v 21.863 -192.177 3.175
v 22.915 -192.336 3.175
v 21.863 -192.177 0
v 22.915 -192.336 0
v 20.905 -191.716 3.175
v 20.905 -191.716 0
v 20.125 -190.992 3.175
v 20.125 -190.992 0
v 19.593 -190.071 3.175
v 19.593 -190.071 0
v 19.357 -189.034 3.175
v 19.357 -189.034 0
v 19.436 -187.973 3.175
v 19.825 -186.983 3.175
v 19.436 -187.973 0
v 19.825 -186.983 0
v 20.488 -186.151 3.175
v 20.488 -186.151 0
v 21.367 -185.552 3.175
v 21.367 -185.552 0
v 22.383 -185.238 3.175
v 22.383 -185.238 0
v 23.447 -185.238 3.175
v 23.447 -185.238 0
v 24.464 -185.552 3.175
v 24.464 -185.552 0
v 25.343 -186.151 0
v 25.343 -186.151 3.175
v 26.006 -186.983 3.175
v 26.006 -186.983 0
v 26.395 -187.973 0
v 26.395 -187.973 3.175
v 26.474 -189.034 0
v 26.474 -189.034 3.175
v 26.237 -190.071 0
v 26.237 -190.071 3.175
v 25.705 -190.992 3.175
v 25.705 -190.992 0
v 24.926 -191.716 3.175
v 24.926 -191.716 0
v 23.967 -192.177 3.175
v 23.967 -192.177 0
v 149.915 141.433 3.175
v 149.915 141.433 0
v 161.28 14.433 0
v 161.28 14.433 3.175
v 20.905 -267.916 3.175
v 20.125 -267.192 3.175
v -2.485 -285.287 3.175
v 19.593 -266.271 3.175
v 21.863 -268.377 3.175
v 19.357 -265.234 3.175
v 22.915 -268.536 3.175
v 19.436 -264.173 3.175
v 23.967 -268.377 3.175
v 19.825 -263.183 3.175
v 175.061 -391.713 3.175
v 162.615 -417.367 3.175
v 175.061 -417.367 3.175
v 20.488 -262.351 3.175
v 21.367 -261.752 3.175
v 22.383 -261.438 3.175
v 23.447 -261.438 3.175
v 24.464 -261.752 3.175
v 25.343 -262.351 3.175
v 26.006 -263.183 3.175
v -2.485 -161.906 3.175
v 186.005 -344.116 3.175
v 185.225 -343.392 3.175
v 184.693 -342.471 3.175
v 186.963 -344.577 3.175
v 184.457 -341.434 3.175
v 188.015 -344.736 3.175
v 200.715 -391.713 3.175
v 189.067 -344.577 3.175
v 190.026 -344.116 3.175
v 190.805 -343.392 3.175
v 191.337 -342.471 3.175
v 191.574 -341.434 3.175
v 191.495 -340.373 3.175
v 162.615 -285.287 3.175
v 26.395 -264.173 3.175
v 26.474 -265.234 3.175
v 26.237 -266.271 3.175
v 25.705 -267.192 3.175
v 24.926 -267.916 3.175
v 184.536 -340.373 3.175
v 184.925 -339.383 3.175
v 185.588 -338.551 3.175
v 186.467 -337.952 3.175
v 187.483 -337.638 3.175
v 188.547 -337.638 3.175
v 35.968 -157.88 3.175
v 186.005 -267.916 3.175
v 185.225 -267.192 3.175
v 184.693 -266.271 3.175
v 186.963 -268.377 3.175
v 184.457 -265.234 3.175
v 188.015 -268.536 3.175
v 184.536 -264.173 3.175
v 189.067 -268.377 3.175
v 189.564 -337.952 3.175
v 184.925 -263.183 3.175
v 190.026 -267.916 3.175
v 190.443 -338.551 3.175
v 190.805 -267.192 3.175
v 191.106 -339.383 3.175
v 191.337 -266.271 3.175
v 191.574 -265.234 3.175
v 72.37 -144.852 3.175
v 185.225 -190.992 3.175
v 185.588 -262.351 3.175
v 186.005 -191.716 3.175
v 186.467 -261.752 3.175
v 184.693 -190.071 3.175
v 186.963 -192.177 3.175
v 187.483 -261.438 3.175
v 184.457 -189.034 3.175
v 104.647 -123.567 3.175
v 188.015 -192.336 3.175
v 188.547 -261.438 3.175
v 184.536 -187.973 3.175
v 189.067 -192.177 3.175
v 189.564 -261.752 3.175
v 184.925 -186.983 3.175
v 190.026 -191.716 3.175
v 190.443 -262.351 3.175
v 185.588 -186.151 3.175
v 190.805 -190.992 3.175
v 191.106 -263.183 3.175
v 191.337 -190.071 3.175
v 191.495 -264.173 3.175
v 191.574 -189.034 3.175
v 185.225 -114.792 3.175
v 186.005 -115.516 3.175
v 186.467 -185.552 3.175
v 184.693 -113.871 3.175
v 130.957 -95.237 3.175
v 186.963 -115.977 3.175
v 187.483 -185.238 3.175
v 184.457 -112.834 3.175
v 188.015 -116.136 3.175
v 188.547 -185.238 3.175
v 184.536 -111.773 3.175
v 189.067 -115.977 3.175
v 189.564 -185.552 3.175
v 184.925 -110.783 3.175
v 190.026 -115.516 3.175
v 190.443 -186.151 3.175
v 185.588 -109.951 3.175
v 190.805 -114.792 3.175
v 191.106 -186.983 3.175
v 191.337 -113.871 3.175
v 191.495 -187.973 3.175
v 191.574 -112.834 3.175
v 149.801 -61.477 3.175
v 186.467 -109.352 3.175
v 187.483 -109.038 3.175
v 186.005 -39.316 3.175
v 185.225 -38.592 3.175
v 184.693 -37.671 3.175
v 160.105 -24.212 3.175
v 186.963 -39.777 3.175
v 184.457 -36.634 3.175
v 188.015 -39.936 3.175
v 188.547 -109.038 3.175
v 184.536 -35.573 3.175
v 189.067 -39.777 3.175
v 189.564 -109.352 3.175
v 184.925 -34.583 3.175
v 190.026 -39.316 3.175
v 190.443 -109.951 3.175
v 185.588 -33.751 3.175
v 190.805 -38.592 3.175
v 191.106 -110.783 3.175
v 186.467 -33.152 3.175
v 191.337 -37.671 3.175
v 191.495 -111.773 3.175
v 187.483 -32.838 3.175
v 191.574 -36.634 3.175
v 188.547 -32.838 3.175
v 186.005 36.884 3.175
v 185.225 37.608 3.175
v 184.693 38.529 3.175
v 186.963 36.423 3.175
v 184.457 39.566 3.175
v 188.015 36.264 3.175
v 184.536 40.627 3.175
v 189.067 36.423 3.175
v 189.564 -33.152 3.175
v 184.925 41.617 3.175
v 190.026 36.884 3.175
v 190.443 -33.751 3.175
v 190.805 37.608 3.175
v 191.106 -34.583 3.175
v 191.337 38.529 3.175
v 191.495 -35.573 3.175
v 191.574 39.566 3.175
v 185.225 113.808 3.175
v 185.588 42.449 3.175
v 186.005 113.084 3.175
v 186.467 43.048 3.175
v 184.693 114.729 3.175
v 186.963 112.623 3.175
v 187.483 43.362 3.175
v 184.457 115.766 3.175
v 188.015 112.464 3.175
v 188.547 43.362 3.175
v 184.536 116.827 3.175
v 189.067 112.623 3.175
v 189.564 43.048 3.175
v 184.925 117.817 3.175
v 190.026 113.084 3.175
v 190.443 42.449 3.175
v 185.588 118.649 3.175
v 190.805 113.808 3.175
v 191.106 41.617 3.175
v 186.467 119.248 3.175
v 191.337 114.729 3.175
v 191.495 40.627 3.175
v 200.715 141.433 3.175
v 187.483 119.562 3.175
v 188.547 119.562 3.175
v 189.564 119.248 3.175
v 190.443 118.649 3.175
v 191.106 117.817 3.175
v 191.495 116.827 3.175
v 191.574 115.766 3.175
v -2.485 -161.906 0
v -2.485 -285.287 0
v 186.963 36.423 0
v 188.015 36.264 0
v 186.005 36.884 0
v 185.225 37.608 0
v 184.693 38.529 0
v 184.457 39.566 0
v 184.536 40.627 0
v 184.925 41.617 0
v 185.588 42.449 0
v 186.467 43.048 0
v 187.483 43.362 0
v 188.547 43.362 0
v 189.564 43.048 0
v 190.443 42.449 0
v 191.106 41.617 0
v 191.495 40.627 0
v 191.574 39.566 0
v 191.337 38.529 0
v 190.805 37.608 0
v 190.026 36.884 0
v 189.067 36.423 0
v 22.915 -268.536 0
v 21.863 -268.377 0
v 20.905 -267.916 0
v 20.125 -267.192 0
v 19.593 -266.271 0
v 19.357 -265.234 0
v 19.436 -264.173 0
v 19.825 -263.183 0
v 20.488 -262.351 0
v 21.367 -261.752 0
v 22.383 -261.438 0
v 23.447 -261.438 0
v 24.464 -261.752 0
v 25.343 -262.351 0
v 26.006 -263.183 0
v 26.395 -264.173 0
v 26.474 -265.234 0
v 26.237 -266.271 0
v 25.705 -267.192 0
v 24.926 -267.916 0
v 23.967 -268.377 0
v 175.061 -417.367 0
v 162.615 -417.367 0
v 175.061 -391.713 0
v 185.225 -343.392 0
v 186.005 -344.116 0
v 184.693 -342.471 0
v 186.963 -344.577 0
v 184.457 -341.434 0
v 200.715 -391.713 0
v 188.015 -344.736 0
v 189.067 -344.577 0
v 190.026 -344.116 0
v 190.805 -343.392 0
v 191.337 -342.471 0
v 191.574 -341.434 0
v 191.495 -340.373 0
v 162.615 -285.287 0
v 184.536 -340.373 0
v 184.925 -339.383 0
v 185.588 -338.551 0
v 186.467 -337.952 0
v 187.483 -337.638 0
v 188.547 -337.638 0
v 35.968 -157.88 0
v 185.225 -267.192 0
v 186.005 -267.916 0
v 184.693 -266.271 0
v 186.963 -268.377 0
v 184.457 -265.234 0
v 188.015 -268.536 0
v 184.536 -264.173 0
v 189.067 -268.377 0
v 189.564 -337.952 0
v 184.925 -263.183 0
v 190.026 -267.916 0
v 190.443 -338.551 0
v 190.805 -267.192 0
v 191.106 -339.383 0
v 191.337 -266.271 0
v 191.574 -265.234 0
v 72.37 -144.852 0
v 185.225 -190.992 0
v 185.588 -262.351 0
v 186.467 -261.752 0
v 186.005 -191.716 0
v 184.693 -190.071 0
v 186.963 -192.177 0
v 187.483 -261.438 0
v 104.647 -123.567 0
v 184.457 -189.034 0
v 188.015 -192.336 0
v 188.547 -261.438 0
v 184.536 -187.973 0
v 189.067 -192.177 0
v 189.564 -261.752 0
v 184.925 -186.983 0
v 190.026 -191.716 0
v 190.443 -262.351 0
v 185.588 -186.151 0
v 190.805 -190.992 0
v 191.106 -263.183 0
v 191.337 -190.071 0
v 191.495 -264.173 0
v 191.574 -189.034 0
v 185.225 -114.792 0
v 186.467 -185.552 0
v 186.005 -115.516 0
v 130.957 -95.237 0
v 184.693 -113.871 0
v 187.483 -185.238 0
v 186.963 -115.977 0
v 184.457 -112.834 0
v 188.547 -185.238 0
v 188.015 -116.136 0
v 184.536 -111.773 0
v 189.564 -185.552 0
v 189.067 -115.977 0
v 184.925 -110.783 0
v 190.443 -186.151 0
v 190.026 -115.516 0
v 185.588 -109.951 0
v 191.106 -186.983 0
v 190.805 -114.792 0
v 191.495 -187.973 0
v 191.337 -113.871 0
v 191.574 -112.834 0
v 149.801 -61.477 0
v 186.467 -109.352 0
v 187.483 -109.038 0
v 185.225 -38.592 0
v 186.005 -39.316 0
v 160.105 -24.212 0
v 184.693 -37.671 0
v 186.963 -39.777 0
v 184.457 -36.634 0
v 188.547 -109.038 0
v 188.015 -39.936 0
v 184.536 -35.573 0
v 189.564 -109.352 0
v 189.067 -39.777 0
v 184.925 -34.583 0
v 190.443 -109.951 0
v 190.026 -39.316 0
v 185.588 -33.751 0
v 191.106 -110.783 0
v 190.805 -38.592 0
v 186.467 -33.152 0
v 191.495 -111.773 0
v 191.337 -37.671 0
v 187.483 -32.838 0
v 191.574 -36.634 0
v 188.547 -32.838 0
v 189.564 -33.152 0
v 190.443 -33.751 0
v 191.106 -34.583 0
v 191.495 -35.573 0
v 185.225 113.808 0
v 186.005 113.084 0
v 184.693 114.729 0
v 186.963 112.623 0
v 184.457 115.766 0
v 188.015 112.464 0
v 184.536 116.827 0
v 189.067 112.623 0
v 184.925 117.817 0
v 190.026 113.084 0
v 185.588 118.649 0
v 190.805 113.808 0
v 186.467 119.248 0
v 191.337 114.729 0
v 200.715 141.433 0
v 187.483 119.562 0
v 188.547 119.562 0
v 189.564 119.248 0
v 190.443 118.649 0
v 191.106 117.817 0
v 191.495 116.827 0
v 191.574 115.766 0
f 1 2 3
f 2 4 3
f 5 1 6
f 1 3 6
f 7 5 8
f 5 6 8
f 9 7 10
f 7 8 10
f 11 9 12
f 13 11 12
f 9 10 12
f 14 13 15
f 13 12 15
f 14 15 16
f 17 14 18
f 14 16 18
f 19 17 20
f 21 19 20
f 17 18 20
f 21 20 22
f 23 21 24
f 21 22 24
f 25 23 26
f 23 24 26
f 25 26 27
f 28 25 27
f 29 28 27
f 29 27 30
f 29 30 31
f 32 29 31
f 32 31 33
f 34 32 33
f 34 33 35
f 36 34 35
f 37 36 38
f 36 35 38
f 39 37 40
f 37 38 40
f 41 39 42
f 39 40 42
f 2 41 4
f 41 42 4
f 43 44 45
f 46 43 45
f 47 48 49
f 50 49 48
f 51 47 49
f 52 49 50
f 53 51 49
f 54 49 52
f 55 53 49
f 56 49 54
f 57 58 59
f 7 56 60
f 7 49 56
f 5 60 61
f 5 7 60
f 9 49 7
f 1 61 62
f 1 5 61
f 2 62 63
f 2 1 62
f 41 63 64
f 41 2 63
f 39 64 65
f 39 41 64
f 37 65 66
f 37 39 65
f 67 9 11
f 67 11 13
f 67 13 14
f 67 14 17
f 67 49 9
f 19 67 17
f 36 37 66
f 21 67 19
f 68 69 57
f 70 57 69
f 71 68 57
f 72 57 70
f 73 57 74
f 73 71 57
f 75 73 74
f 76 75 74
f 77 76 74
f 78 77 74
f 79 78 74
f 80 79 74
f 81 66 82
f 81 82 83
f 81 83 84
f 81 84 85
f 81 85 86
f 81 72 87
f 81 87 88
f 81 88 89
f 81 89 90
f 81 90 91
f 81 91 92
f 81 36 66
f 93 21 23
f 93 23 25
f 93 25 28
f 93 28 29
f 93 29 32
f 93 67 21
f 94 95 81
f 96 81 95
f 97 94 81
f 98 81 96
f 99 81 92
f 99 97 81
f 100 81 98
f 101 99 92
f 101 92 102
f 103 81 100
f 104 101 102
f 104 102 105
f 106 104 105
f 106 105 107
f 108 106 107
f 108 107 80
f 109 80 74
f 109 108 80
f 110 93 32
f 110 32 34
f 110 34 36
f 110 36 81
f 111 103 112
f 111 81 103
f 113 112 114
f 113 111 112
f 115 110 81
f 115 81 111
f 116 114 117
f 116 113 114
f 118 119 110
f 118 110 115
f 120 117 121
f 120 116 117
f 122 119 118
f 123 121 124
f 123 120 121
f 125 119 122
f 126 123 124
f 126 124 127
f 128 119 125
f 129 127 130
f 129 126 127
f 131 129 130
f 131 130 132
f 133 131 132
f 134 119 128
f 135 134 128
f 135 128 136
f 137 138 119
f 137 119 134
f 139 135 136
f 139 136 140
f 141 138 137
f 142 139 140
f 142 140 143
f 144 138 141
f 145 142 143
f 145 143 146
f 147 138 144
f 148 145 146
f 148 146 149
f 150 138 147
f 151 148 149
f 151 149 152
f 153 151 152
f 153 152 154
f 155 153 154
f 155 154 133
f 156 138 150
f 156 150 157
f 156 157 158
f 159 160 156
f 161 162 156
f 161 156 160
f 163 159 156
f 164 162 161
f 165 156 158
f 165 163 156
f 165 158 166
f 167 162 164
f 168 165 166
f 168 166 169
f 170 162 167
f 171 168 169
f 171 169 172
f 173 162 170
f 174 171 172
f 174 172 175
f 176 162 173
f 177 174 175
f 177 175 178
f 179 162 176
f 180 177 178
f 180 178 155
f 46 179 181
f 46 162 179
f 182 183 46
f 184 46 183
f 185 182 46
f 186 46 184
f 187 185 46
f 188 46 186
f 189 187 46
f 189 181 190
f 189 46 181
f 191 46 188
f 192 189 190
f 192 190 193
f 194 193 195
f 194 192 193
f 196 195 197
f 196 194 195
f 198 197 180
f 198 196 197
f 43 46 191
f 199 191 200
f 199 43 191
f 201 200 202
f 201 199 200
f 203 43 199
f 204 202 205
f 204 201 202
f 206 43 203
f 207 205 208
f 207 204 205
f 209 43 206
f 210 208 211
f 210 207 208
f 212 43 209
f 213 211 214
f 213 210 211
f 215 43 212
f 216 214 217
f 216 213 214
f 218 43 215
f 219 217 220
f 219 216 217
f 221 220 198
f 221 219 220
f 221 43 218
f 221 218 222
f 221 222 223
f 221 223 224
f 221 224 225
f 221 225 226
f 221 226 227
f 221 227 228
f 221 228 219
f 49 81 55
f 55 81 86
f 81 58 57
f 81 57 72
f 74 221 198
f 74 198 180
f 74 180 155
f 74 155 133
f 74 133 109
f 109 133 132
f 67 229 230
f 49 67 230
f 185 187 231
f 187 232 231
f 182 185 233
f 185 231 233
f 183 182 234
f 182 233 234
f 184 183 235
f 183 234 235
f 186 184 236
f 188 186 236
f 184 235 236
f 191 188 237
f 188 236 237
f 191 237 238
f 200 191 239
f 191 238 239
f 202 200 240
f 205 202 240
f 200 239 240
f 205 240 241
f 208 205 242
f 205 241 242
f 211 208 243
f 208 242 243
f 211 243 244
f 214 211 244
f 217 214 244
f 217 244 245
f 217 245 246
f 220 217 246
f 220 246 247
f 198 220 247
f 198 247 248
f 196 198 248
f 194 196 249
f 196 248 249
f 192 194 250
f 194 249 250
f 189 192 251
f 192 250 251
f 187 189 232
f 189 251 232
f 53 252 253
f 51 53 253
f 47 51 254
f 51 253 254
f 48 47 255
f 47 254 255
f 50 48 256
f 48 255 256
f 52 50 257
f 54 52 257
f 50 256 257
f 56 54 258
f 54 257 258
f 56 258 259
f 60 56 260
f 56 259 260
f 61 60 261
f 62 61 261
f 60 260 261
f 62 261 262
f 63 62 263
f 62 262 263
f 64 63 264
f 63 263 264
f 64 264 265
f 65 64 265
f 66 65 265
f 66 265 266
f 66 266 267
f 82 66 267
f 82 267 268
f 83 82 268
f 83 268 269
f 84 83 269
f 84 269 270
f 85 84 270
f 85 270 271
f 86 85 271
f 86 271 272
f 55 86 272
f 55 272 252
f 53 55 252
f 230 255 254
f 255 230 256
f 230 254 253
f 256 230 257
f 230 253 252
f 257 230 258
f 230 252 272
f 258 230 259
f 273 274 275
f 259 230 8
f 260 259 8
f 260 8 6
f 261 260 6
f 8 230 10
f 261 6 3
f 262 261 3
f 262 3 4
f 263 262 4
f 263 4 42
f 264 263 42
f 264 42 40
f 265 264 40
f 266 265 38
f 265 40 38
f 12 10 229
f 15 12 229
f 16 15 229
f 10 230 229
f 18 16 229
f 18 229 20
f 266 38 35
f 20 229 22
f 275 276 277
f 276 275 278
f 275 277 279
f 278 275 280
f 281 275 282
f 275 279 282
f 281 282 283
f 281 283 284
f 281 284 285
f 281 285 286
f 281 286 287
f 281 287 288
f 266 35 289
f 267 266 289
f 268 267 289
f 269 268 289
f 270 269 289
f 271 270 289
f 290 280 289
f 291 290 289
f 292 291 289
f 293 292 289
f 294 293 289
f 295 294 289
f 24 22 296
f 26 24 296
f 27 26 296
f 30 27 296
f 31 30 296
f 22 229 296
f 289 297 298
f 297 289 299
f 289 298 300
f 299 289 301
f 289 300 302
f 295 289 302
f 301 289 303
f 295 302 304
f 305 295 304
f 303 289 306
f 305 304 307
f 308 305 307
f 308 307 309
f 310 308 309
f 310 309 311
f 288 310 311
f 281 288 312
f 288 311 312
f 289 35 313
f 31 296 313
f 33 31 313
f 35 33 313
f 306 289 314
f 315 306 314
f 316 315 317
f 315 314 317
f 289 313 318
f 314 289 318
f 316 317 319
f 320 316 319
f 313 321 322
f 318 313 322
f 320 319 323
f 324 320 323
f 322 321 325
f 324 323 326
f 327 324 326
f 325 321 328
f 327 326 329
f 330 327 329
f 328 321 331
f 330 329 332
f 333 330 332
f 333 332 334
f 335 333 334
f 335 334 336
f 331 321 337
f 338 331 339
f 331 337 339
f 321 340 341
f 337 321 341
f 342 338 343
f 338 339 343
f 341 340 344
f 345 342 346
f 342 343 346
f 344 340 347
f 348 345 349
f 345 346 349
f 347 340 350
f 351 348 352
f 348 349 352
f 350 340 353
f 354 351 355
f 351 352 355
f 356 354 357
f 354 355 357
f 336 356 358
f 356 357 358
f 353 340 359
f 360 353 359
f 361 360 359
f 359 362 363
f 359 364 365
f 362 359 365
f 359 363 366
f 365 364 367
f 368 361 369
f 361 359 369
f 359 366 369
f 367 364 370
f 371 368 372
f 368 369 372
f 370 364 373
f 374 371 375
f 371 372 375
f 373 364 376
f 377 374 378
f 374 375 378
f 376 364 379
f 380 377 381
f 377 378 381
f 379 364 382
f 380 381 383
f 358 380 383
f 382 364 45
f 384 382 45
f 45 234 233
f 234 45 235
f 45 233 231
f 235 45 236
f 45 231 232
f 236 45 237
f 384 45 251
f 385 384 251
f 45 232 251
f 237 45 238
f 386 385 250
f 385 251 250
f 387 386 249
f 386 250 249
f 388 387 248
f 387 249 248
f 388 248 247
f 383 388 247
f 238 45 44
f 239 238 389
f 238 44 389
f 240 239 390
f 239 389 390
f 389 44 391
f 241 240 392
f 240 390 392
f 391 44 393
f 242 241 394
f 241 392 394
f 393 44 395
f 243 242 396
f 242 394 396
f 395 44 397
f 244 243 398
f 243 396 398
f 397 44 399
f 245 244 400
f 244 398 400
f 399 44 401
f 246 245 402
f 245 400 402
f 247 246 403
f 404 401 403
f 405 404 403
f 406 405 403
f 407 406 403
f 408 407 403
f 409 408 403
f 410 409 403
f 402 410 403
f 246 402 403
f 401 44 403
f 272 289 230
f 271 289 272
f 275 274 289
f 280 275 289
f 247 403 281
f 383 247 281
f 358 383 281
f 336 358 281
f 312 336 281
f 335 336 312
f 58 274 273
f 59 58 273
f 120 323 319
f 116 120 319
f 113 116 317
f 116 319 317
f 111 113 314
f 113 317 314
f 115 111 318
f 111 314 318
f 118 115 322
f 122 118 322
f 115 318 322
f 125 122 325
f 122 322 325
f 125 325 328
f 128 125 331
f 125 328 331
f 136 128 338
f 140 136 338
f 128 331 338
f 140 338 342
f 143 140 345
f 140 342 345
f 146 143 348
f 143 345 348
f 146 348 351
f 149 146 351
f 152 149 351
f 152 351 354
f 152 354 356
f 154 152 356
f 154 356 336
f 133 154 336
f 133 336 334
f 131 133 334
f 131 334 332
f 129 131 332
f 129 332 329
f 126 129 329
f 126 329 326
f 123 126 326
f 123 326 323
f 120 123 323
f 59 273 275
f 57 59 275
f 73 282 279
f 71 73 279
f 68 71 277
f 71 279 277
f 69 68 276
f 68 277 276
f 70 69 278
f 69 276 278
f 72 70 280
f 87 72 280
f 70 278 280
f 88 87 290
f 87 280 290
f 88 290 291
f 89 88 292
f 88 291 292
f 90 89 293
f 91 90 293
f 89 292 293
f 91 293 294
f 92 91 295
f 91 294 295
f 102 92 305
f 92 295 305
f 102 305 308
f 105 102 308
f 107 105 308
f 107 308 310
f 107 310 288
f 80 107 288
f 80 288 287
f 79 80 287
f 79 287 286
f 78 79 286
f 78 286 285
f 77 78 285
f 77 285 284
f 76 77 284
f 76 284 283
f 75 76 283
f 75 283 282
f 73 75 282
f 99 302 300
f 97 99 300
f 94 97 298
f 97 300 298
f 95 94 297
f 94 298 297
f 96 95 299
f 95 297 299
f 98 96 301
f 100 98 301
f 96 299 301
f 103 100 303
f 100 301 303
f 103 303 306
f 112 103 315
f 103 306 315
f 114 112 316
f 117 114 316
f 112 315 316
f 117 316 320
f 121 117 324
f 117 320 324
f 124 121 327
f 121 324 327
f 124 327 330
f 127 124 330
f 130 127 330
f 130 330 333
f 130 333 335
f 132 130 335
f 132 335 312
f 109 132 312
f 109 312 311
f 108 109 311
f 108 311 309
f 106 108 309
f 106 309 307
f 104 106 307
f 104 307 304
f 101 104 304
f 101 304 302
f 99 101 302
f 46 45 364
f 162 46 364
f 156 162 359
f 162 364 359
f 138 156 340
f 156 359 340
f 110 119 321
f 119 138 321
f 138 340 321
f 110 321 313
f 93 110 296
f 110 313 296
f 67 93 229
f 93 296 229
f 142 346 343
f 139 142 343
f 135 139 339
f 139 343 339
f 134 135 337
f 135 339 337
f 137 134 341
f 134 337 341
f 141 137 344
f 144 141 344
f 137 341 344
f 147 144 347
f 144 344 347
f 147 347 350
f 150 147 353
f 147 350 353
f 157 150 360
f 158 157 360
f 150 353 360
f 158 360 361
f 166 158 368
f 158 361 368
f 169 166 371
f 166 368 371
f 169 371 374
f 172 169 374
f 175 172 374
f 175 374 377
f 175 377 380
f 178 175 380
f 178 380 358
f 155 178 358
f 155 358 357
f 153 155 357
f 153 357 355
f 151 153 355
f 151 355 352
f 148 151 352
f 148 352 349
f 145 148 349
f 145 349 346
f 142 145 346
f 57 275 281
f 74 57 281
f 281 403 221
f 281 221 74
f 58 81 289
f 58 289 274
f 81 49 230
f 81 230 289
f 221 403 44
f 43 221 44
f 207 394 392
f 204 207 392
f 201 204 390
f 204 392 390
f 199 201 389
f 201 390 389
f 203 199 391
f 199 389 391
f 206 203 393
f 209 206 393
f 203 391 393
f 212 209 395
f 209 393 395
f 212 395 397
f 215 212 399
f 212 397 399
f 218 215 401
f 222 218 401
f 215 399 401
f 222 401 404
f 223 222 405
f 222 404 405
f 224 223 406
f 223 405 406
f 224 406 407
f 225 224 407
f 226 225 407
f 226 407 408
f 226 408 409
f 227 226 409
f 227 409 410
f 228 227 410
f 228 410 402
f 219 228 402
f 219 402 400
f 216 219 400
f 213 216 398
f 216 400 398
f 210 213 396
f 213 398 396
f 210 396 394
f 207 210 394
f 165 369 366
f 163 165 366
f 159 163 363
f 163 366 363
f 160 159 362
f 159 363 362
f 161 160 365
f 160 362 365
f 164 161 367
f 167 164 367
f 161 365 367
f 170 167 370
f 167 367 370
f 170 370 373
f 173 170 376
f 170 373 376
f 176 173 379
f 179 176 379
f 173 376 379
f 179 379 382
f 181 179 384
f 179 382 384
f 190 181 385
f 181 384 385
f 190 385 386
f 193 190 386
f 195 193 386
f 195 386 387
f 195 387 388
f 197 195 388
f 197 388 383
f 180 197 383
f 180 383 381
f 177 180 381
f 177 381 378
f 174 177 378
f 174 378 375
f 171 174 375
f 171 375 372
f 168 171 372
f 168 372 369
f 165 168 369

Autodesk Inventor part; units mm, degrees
ref_plane "YZ Plane" through (0, 0, 0) normal (1, 0, 0) x (0, 1, 0)
ref_plane "XZ Plane" through (0, 0, 0) normal (0, 1, 0) x (-1, 0, 0)
ref_plane "XY Plane" through (0, 0, 0) normal (0, 0, 1) x (1, 0, 0)
sketch "Sketch1" plane through (0, 0, 0) normal (0, 0, 1) x (1, 0, 0)
  arc A0 (-2.4847, -161.9059) -> (161.2805, 14.4329) centre (0, 0) ccw
  line L0 (-2.4847, -161.9059) -> (-2.4847, -174.6059)
  line L1 (175.9176, 141.4329) -> (149.9153, 141.4329)
  line L2 (149.9153, 141.4329) -> (200.7153, 141.4329)
  line L3 (200.7153, 141.4329) -> (200.7153, -174.6059)
  line L4 (149.9153, 141.4329) -> (161.2805, 14.4329)
  line L5 (-2.4847, -161.9224) -> (-2.4847, -174.6059)
  line L6 (200.7153, 141.4329) -> (200.7153, -391.7131)
  line L7 (-2.4847, -174.6059) -> (-2.4847, -417.3671)
  line L8 (-2.4847, -417.3671) -> (175.0613, -417.3671)
  line L9 (200.7153, -417.3671) -> (199.9221, -417.3671)
  line L10 (175.0613, -417.3671) -> (175.0613, -391.7131)
  line L11 (175.0613, -391.7131) -> (200.7153, -391.7131)
  dimension "d1" = 323.85
  dimension "d4" = 50.8
  dimension "d6" = 127
  dimension "d9" = 11.3652
  dimension "d10" = 127.5075
  dimension "d11" = 558.8
  dimension "d14" = 203.2
  dimension "d15" = 25.654
  dimension "d16" = 25.654
extrude "Extrusion1" add sketch "Sketch1" along normal blind 3.175
sketch "Sketch2" plane through (0, 0, 3.175) normal (0, 0, 1) x (1, 0, 0)
  line L0 (200.7153, 141.4329) -> (200.7153, -391.7131) projected
  line L1 (200.7153, 141.4329) -> (149.9153, 141.4329) projected
  point P0 (0, 0)
  point P1 (188.0153, 116.0329)
  point P2 (188.0153, 39.8329)
  point P3 (188.0153, -36.3671)
  point P4 (188.0153, -112.5671)
  point P5 (188.0153, -188.7671)
  point P6 (188.0153, -264.9671)
  point P7 (188.0153, -341.1671)
  dimension "d19" = 12.7
  dimension "d20" = 12.7
  dimension "d21" = 12.7
  dimension "d22" = 12.7
  dimension "d23" = 12.7
  dimension "d24" = 12.7
  dimension "d25" = 76.2
  dimension "d26" = 76.2
  dimension "d27" = 76.2
  dimension "d28" = 76.2
  dimension "d29" = 76.2
  dimension "d30" = 76.2
  dimension "d31" = 25.4
hole "Hole1" at (188.0153, 116.0329, 3.175) at (188.0153, 39.8329, 3.175) at (188.0153, -36.3671, 3.175) at (188.0153, -112.5671, 3.175) at (188.0153, -188.7671, 3.175) at (188.0153, -264.9671, 3.175) at (188.0153, -341.1671, 3.175) direction (0, 0, -1) diameter 7.1374 end through all
sketch "Sketch3" plane through (0, 0, 3.175) normal (0, 0, 1) x (1, 0, 0)
  line L0 (-2.4847, -161.9059) -> (-2.4847, -417.3671) projected
  line L1 (-2.4847, -417.3671) -> (175.0613, -417.3671) projected
  point P0 (0, 0)
  point P1 (22.9153, -188.7671)
  point P2 (22.9153, -264.9671)
  point P3 (22.9153, -341.1671)
  dimension "d39" = 25.4
  dimension "d40" = 25.4
  dimension "d41" = 25.4
  dimension "d42" = 76.2
  dimension "d43" = 76.2
  dimension "d44" = 76.2
hole "Hole2" at (22.9153, -188.7671, 3.175) at (22.9153, -264.9671, 3.175) at (22.9153, -341.1671, 3.175) direction (0, 0, -1) diameter 7.1374 end through all
sketch "Sketch4" plane through (0, 0, 3.175) normal (0, 0, 1) x (1, 0, 0)
  line L0 (-2.4847, -417.3671) -> (175.0613, -417.3671) projected
  line L1 (-2.4847, -161.9059) -> (-2.4847, -417.3671) projected
  line L2 (162.6153, -417.3671) -> (-2.4847, -417.3671)
  line L3 (-2.4847, -417.3671) -> (-2.4847, -285.2871)
  line L4 (-2.4847, -285.2871) -> (162.6153, -285.2871)
  line L5 (162.6153, -285.2871) -> (162.6153, -417.3671)
  line L6 (175.0613, -417.3671) -> (175.0613, -391.7131) projected
  line L7 (175.0613, -391.7131) -> (200.7153, -391.7131) projected
  line L8 (200.7153, -391.7131) -> (200.7153, 141.4329) projected
  circle A0 centre (22.9153, -341.1671) radius 3.5687 projected
  circle A1 centre (22.9153, -264.9671) radius 3.5687 projected
  point P0 (0, 0)
  dimension "d52" = 132.08
  dimension "d53" = 38.1
extrude "Extrusion2" cut sketch "Sketch4" against normal blind 25.4 contours L1 L4 L5 L0
properties part number "LauncherSidePlate"
